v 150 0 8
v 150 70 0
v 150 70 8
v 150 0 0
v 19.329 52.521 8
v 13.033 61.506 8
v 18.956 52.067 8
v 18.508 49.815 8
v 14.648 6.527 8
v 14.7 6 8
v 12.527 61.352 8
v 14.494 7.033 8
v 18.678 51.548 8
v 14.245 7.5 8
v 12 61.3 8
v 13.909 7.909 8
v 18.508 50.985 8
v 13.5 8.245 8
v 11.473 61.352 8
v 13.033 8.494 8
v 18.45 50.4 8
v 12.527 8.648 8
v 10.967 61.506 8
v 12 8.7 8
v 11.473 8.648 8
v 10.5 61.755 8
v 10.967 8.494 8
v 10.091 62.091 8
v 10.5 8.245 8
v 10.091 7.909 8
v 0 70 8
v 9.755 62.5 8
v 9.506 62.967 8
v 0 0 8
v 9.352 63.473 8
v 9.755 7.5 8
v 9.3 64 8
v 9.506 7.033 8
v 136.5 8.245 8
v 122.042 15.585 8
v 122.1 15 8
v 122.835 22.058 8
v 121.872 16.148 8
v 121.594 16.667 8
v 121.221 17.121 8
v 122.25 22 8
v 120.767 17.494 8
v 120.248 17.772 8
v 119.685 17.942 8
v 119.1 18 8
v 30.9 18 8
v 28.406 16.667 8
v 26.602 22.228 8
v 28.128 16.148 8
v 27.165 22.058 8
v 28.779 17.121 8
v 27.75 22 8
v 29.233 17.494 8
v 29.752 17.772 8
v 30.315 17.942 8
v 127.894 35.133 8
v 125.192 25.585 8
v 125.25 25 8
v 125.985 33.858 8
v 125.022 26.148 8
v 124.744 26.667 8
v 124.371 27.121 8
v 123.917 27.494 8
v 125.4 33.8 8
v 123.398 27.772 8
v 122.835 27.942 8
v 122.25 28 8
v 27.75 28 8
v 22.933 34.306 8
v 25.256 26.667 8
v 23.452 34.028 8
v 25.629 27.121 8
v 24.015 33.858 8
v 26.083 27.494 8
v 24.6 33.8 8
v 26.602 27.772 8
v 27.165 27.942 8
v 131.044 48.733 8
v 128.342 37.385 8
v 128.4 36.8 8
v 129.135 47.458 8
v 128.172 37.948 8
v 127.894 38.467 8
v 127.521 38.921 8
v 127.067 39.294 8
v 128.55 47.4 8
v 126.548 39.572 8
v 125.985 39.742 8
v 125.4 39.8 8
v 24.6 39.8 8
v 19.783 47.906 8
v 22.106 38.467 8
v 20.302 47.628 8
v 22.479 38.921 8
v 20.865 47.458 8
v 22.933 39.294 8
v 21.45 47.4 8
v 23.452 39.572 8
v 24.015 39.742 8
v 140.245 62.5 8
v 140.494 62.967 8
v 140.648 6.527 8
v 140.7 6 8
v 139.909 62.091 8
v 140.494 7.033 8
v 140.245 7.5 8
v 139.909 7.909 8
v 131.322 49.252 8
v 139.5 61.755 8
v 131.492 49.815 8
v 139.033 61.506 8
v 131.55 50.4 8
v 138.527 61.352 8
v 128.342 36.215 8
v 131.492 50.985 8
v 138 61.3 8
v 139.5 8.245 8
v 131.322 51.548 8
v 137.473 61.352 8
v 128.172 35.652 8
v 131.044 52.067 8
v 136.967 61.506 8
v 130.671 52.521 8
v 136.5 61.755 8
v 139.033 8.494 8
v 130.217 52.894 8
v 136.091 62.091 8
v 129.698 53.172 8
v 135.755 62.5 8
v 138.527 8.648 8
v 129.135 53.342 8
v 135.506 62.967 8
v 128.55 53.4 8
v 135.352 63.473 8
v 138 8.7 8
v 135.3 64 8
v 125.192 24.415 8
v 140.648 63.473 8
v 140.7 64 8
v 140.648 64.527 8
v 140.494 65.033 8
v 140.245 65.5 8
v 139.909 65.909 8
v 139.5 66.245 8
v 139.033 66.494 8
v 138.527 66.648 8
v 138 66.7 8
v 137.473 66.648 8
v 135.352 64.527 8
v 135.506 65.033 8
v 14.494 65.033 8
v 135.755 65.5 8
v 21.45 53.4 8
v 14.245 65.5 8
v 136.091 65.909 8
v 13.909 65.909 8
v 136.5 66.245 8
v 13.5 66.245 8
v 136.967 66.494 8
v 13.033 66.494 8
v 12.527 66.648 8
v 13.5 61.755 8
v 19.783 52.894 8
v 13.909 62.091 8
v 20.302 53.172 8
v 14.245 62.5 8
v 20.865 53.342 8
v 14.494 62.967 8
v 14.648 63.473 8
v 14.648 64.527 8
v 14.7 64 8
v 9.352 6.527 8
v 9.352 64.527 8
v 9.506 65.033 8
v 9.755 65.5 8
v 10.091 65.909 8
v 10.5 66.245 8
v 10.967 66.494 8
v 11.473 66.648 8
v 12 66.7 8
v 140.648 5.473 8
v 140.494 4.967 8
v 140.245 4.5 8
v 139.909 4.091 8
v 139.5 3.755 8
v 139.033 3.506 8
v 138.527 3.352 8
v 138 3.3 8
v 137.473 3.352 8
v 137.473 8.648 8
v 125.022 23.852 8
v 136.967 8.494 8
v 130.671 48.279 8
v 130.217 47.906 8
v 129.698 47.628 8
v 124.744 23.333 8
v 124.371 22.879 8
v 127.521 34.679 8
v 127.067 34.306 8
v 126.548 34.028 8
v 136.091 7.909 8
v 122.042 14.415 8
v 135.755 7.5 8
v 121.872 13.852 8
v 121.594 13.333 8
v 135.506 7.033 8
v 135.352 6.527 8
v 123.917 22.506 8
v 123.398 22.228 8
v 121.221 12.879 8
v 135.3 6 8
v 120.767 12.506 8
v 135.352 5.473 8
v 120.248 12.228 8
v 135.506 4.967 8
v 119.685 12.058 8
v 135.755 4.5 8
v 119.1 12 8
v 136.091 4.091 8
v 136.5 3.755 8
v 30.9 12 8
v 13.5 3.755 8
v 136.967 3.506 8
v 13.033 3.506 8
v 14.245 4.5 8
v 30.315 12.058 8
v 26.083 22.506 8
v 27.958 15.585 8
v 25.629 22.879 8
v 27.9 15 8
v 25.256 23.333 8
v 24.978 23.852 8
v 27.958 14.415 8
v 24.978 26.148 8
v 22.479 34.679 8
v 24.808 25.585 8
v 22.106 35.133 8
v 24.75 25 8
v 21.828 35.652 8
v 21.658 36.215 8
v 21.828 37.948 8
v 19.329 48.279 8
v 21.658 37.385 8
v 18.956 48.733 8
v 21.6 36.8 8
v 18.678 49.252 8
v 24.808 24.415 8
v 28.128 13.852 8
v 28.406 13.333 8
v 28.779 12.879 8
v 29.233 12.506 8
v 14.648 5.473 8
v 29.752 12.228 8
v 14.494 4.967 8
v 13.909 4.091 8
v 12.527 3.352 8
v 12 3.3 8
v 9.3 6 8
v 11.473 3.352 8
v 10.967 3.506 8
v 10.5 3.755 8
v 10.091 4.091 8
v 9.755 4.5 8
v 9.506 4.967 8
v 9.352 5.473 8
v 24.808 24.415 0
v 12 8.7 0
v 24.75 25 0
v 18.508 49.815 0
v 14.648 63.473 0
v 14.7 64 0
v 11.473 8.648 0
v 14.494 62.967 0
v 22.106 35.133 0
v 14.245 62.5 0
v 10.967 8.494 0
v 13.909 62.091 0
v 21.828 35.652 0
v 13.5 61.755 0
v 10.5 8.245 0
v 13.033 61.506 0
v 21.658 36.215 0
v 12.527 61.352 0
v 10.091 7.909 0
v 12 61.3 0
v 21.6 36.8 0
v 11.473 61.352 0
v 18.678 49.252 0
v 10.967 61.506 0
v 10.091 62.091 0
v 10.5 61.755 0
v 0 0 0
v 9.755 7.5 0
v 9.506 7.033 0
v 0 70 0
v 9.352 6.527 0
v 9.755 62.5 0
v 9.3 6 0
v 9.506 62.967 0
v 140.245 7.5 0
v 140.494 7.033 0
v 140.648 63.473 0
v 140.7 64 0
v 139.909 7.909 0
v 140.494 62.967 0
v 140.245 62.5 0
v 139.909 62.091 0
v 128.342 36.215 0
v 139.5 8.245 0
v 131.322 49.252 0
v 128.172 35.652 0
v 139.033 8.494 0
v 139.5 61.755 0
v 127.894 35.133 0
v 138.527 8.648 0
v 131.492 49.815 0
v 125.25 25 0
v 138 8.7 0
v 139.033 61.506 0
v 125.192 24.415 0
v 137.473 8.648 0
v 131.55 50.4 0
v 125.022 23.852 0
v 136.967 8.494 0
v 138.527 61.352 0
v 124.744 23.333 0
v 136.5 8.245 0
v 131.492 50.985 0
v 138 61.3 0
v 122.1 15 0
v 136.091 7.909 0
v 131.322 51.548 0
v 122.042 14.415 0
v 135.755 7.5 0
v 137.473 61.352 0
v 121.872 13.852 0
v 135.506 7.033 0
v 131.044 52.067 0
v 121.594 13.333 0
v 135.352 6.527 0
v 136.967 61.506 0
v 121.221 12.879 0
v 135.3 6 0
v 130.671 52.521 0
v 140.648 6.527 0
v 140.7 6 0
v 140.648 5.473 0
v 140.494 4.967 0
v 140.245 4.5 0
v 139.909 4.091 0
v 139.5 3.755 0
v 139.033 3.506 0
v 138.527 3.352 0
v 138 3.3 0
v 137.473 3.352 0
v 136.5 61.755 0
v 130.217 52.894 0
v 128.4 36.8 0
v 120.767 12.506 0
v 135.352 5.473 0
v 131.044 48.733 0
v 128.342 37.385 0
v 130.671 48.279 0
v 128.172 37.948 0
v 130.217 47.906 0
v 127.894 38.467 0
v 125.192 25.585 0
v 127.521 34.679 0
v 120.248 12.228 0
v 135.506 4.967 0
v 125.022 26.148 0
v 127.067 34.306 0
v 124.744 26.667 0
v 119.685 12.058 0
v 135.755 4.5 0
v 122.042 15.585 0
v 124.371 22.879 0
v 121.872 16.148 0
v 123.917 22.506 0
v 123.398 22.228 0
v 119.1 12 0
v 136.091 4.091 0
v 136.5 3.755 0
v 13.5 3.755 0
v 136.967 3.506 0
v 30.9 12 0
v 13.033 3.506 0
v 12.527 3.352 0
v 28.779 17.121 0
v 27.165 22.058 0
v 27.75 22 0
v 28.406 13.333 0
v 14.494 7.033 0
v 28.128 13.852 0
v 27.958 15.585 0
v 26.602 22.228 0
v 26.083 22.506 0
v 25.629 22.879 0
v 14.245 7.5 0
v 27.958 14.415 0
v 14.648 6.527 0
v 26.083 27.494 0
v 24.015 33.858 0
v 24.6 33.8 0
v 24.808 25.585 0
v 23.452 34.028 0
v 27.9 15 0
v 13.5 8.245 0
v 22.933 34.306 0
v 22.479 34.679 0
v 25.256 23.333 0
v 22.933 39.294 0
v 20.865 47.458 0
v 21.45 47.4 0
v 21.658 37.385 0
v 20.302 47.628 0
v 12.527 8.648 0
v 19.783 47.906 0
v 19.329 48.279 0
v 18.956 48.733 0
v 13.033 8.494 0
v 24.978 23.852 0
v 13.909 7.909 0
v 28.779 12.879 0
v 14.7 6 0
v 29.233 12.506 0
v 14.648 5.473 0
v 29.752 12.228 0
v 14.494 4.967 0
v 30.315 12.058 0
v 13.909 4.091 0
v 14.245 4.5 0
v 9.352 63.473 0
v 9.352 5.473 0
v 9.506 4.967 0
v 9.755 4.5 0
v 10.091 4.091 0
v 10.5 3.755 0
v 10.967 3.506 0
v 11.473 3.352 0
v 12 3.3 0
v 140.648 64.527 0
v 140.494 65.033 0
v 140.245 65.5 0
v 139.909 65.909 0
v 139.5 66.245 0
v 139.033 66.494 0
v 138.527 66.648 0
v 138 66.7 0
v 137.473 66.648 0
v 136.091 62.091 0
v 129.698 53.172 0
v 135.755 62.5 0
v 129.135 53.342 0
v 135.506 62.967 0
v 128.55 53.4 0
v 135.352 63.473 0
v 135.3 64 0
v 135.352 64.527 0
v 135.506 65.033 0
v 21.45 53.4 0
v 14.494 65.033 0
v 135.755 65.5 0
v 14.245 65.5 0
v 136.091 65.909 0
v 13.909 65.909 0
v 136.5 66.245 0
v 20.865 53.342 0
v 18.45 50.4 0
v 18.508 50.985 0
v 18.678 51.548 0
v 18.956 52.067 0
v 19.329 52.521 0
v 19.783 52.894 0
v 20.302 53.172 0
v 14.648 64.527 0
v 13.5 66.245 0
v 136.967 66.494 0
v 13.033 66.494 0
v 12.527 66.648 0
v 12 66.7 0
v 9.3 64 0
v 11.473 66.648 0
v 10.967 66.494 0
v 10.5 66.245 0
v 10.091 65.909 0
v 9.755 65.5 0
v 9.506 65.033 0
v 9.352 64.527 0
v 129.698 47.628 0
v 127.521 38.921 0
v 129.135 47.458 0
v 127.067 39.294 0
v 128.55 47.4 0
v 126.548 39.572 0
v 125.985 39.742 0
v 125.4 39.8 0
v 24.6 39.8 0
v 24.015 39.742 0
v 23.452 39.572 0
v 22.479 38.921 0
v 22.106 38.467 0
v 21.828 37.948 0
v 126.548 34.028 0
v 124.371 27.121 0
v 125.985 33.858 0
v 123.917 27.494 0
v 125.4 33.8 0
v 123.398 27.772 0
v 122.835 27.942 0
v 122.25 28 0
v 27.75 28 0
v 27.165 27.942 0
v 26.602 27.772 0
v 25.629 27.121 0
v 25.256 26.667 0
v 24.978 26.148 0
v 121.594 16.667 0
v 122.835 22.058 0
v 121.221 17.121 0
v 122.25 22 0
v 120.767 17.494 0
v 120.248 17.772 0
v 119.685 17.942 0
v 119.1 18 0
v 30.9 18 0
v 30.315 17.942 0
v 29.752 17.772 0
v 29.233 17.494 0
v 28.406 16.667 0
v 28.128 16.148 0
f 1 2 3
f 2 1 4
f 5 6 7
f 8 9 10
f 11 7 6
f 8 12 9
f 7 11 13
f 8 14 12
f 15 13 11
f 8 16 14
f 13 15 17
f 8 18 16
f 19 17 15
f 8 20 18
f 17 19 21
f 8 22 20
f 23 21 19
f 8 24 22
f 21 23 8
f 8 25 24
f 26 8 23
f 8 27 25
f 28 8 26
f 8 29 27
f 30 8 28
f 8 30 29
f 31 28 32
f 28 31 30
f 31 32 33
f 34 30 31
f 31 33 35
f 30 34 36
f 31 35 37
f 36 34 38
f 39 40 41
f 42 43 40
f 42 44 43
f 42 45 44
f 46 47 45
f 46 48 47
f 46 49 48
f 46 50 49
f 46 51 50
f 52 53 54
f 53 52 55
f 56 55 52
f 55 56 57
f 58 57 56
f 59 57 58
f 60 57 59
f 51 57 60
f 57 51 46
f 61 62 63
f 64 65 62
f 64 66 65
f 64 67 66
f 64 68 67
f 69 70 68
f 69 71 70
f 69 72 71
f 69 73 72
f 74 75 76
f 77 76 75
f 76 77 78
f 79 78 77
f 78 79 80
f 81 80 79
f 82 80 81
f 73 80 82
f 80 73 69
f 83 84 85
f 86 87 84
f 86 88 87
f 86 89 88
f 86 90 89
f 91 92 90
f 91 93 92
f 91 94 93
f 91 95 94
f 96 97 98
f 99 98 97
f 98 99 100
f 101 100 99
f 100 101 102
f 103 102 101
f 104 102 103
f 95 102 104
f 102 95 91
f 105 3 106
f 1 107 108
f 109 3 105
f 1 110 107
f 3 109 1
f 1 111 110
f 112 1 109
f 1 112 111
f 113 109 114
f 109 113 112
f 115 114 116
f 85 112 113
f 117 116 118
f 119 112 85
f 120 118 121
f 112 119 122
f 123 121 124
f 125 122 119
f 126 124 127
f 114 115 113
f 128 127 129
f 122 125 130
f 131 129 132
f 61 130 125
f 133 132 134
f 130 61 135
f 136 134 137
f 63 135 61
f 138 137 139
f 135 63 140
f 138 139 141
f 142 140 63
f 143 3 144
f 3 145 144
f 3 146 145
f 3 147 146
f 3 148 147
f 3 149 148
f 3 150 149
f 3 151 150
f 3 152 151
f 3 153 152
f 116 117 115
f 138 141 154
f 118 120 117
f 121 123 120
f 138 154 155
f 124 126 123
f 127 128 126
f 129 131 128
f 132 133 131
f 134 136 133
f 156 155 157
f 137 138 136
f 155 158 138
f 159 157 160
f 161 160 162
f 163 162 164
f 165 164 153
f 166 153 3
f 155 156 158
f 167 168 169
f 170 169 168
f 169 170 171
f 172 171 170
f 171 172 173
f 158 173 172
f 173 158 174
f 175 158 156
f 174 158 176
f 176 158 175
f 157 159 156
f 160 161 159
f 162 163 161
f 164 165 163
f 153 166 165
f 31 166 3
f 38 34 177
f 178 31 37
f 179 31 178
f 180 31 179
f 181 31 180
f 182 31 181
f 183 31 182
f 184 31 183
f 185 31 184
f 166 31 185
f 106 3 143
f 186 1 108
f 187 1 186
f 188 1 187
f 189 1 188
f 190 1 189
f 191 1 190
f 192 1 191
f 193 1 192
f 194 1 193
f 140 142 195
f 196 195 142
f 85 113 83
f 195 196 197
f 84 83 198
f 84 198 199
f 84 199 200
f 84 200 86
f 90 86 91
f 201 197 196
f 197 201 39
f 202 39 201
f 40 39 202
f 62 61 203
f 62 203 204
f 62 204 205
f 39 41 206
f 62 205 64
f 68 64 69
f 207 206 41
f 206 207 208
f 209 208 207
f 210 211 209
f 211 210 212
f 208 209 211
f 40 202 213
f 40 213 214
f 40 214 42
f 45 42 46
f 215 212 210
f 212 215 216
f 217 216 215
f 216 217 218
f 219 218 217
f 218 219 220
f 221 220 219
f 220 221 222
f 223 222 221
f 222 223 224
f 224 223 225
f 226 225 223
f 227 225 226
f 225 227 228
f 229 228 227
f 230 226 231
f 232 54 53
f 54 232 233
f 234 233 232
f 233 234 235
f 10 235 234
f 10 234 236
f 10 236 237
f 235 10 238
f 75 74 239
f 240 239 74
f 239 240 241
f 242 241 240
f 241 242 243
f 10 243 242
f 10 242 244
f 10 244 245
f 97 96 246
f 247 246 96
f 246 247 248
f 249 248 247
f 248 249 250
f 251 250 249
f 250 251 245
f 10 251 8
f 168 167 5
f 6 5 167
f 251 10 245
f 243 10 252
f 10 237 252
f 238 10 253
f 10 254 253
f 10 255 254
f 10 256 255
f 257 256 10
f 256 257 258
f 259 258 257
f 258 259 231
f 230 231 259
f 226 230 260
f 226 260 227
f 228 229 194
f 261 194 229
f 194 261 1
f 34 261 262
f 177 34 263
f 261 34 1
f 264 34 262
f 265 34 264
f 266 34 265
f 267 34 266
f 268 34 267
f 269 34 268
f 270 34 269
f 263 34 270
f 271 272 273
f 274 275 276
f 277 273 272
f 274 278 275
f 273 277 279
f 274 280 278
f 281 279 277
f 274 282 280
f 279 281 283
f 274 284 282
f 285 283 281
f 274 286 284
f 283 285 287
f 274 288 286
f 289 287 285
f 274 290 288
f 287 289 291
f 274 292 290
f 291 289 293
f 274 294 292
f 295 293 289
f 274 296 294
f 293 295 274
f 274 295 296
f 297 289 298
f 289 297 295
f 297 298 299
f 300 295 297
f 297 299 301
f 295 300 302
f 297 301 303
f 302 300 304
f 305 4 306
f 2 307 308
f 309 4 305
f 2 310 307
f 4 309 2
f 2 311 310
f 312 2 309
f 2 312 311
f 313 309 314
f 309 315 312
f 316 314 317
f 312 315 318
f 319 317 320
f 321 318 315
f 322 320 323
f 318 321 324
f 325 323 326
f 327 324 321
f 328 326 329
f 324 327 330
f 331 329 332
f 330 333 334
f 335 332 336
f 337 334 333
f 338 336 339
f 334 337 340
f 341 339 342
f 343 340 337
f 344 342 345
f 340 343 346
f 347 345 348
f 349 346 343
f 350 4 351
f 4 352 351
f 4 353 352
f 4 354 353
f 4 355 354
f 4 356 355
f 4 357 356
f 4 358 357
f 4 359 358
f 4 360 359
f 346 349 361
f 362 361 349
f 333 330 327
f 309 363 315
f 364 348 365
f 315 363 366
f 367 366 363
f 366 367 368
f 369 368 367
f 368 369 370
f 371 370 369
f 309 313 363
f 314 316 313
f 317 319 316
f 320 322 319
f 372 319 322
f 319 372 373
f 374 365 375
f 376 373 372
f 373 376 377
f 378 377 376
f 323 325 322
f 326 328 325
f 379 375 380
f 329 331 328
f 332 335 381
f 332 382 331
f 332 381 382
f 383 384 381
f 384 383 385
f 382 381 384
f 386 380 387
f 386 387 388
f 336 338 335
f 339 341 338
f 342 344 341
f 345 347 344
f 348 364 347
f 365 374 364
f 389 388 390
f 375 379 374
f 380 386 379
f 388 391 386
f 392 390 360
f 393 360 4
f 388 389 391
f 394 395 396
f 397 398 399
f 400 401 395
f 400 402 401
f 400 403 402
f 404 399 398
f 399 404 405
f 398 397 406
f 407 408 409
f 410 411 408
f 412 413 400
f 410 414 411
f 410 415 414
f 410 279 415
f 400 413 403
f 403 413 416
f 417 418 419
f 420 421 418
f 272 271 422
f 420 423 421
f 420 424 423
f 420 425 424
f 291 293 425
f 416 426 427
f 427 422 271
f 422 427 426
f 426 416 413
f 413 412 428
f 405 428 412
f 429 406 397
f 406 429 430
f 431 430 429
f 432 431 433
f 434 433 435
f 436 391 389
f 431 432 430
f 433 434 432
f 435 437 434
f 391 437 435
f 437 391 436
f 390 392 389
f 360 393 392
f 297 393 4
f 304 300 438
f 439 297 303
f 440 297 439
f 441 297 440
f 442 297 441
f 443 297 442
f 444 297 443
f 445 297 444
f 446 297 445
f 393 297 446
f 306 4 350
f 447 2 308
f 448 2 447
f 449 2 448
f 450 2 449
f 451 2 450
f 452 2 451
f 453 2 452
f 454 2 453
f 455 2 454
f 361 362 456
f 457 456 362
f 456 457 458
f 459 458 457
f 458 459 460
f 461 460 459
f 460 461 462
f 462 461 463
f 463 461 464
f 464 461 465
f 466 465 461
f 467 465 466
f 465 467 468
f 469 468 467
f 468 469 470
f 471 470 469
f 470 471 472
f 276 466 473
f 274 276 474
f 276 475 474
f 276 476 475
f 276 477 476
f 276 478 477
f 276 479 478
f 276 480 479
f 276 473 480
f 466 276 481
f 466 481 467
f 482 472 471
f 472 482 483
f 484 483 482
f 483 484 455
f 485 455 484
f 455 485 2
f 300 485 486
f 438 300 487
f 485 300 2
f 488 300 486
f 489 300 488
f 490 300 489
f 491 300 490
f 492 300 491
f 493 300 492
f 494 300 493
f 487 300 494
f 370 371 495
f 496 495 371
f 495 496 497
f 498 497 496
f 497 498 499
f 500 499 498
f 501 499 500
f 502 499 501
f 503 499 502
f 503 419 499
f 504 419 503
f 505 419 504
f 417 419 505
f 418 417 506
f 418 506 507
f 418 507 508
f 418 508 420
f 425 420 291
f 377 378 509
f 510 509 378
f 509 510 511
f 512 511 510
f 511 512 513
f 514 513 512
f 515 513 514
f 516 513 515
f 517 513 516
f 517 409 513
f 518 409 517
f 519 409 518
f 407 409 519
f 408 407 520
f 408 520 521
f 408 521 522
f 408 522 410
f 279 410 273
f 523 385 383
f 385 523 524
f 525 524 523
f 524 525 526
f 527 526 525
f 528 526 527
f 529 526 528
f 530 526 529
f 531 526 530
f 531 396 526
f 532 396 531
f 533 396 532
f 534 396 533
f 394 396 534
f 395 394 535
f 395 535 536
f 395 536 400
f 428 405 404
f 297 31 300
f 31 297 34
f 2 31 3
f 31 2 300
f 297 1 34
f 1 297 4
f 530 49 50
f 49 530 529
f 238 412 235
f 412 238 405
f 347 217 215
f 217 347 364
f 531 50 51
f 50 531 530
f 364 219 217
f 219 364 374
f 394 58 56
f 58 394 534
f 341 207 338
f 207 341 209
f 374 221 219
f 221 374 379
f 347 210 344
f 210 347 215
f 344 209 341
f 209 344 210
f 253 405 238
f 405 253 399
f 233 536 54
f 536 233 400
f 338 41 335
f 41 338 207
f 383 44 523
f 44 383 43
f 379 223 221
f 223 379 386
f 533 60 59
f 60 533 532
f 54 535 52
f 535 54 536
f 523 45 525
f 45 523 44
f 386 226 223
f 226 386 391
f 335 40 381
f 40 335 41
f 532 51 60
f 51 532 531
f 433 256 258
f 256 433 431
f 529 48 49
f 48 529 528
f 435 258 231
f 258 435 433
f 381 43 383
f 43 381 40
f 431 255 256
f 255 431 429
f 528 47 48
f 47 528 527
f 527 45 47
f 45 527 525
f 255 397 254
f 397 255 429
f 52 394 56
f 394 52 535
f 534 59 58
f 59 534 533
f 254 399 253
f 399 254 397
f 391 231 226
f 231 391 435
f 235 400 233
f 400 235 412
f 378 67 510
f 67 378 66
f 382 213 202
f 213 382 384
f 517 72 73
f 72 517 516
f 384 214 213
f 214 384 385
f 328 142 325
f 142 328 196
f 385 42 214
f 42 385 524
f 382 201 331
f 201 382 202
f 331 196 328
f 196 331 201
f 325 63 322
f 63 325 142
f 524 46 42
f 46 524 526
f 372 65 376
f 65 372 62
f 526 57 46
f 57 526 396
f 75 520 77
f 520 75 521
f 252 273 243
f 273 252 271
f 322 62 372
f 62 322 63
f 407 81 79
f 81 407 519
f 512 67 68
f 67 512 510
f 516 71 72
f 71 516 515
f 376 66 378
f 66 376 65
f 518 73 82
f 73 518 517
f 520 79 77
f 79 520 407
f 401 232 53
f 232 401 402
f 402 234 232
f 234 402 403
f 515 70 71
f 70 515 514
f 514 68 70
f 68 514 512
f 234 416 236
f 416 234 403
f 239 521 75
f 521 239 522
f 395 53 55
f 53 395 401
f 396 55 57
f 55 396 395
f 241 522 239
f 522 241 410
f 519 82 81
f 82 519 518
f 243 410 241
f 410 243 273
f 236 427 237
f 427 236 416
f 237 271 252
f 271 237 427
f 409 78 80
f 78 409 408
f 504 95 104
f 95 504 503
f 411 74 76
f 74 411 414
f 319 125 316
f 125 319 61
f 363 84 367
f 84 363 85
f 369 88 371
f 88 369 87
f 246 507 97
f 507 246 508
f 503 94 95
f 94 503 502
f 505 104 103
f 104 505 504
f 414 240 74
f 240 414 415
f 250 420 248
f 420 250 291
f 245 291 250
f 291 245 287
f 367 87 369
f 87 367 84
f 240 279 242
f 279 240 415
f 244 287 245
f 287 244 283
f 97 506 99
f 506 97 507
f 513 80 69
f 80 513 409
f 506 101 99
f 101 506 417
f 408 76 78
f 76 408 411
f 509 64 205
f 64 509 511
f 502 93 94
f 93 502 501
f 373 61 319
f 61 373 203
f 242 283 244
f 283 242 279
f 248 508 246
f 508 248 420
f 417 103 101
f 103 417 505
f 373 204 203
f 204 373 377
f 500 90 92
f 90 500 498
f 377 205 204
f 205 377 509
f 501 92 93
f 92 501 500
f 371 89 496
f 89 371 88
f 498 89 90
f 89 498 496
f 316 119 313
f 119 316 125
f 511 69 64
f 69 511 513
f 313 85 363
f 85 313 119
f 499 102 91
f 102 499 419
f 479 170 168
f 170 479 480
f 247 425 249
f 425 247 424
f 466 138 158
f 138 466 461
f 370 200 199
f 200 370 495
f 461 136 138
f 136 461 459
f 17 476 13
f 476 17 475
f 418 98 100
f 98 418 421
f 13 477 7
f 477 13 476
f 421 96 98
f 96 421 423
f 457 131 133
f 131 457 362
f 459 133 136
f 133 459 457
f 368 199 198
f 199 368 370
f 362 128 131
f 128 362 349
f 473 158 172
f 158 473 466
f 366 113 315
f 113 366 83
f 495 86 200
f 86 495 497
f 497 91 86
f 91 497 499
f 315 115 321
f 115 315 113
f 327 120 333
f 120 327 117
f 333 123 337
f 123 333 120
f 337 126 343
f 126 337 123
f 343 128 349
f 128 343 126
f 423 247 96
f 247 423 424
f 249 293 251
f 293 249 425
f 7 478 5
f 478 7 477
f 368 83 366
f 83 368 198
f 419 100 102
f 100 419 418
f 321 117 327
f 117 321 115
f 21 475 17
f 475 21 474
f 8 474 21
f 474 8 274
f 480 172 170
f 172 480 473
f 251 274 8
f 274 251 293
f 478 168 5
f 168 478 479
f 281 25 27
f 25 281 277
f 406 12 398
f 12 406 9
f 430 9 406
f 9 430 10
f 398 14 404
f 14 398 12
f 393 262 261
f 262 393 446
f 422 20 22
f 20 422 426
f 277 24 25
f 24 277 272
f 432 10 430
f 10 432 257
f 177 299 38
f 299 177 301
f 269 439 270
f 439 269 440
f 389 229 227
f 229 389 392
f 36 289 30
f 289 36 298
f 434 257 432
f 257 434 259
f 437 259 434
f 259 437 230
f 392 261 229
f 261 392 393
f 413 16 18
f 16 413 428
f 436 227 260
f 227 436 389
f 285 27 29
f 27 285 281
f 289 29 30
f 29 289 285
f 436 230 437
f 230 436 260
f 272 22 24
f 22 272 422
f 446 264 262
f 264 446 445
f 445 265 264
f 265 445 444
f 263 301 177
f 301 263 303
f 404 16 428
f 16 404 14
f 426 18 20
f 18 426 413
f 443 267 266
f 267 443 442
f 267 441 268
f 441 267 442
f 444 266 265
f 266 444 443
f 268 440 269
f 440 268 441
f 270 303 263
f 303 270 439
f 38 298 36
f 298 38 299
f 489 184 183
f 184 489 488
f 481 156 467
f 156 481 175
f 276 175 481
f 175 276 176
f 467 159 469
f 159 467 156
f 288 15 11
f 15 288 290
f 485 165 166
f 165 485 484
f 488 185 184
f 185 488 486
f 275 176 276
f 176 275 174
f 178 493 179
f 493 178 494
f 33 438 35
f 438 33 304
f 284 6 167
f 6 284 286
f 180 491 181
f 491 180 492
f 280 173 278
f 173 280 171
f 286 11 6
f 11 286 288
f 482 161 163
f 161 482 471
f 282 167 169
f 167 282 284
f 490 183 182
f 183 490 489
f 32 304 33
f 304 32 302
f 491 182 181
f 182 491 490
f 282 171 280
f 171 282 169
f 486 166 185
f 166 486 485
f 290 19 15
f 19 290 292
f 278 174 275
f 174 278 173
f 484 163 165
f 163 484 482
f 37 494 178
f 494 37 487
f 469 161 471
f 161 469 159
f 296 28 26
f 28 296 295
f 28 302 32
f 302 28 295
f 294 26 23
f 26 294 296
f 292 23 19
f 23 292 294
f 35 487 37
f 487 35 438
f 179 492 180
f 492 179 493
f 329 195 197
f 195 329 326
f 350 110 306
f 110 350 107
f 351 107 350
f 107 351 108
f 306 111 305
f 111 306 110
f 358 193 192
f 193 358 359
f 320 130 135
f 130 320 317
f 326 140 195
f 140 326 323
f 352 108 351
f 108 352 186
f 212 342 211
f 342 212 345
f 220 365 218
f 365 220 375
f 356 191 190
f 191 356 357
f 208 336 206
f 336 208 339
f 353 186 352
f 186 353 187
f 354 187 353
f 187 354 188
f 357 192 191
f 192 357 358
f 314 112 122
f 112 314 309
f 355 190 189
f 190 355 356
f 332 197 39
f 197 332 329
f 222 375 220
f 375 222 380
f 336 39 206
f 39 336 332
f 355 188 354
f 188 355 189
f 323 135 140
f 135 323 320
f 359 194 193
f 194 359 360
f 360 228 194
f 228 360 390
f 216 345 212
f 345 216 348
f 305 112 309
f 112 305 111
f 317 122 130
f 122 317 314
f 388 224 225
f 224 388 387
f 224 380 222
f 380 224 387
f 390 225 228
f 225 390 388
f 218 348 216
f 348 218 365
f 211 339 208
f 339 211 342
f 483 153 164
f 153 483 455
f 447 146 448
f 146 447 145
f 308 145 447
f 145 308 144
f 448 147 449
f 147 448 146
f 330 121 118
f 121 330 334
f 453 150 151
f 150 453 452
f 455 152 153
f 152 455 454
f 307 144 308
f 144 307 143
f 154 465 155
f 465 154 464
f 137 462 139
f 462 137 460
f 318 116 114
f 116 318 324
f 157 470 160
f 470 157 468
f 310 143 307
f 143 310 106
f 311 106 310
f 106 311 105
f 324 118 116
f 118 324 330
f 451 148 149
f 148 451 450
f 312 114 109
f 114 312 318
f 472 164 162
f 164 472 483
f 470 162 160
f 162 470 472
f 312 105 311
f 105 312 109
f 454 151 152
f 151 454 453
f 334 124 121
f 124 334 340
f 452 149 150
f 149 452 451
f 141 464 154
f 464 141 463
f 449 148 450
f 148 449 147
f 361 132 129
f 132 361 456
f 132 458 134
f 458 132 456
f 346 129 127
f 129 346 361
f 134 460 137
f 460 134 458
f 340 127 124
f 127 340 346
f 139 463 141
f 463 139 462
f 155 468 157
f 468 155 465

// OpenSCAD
$fn = 32;

// ----------------------------------------------------------------------
// Slotted panel: 150 x 70 mm, 4 ряда of slots
// ----------------------------------------------------------------------

// --- parameters (mm) ---
panel_w = 150;            // panel width
panel_d = 70;             // panel depth
thick = 8;                // panel thickness
slot_w = 6;               // slot width
pitch0 = 10;              // first row pitch
pitch_step = 1.8;         // pitch increase per row
margin = 12;              // margin around the slot field
rows = 4;                 // number of slot rows
mount_d = 5.4;            // mounting holes
mount_x = 63;             // mounting hole offset

difference() {
  union() {
    cube([panel_w, panel_d, thick]);
  }
  /* slot rows: stadium shaped cutters, 2.5 mm clear of both faces */
  /* row 0: pitch 10, length 88.2 */
  hull() {
    translate([30.9, 15, -2.5]) cylinder(h = thick + 5, d = slot_w);
    translate([119.1, 15, -2.5]) cylinder(h = thick + 5, d = slot_w);
  }
  /* row 1: pitch 11.8, length 94.5 */
  hull() {
    translate([27.75, 25, -2.5]) cylinder(h = thick + 5, d = slot_w);
    translate([122.25, 25, -2.5]) cylinder(h = thick + 5, d = slot_w);
  }
  /* row 2: pitch 13.6, length 100.8 */
  hull() {
    translate([24.6, 36.8, -2.5]) cylinder(h = thick + 5, d = slot_w);
    translate([125.4, 36.8, -2.5]) cylinder(h = thick + 5, d = slot_w);
  }
  /* row 3: pitch 15.4, length 107.1 */
  hull() {
    translate([21.45, 50.4, -2.5]) cylinder(h = thick + 5, d = slot_w);
    translate([128.55, 50.4, -2.5]) cylinder(h = thick + 5, d = slot_w);
  }
  translate([12, 6, -2.5]) cylinder(h = 13, d = mount_d);
  translate([12, 64, -2.5]) cylinder(h = 13, d = mount_d);
  translate([138, 6, -2.5]) cylinder(h = 13, d = mount_d);
  translate([138, 64, -2.5]) cylinder(h = 13, d = mount_d);
}
